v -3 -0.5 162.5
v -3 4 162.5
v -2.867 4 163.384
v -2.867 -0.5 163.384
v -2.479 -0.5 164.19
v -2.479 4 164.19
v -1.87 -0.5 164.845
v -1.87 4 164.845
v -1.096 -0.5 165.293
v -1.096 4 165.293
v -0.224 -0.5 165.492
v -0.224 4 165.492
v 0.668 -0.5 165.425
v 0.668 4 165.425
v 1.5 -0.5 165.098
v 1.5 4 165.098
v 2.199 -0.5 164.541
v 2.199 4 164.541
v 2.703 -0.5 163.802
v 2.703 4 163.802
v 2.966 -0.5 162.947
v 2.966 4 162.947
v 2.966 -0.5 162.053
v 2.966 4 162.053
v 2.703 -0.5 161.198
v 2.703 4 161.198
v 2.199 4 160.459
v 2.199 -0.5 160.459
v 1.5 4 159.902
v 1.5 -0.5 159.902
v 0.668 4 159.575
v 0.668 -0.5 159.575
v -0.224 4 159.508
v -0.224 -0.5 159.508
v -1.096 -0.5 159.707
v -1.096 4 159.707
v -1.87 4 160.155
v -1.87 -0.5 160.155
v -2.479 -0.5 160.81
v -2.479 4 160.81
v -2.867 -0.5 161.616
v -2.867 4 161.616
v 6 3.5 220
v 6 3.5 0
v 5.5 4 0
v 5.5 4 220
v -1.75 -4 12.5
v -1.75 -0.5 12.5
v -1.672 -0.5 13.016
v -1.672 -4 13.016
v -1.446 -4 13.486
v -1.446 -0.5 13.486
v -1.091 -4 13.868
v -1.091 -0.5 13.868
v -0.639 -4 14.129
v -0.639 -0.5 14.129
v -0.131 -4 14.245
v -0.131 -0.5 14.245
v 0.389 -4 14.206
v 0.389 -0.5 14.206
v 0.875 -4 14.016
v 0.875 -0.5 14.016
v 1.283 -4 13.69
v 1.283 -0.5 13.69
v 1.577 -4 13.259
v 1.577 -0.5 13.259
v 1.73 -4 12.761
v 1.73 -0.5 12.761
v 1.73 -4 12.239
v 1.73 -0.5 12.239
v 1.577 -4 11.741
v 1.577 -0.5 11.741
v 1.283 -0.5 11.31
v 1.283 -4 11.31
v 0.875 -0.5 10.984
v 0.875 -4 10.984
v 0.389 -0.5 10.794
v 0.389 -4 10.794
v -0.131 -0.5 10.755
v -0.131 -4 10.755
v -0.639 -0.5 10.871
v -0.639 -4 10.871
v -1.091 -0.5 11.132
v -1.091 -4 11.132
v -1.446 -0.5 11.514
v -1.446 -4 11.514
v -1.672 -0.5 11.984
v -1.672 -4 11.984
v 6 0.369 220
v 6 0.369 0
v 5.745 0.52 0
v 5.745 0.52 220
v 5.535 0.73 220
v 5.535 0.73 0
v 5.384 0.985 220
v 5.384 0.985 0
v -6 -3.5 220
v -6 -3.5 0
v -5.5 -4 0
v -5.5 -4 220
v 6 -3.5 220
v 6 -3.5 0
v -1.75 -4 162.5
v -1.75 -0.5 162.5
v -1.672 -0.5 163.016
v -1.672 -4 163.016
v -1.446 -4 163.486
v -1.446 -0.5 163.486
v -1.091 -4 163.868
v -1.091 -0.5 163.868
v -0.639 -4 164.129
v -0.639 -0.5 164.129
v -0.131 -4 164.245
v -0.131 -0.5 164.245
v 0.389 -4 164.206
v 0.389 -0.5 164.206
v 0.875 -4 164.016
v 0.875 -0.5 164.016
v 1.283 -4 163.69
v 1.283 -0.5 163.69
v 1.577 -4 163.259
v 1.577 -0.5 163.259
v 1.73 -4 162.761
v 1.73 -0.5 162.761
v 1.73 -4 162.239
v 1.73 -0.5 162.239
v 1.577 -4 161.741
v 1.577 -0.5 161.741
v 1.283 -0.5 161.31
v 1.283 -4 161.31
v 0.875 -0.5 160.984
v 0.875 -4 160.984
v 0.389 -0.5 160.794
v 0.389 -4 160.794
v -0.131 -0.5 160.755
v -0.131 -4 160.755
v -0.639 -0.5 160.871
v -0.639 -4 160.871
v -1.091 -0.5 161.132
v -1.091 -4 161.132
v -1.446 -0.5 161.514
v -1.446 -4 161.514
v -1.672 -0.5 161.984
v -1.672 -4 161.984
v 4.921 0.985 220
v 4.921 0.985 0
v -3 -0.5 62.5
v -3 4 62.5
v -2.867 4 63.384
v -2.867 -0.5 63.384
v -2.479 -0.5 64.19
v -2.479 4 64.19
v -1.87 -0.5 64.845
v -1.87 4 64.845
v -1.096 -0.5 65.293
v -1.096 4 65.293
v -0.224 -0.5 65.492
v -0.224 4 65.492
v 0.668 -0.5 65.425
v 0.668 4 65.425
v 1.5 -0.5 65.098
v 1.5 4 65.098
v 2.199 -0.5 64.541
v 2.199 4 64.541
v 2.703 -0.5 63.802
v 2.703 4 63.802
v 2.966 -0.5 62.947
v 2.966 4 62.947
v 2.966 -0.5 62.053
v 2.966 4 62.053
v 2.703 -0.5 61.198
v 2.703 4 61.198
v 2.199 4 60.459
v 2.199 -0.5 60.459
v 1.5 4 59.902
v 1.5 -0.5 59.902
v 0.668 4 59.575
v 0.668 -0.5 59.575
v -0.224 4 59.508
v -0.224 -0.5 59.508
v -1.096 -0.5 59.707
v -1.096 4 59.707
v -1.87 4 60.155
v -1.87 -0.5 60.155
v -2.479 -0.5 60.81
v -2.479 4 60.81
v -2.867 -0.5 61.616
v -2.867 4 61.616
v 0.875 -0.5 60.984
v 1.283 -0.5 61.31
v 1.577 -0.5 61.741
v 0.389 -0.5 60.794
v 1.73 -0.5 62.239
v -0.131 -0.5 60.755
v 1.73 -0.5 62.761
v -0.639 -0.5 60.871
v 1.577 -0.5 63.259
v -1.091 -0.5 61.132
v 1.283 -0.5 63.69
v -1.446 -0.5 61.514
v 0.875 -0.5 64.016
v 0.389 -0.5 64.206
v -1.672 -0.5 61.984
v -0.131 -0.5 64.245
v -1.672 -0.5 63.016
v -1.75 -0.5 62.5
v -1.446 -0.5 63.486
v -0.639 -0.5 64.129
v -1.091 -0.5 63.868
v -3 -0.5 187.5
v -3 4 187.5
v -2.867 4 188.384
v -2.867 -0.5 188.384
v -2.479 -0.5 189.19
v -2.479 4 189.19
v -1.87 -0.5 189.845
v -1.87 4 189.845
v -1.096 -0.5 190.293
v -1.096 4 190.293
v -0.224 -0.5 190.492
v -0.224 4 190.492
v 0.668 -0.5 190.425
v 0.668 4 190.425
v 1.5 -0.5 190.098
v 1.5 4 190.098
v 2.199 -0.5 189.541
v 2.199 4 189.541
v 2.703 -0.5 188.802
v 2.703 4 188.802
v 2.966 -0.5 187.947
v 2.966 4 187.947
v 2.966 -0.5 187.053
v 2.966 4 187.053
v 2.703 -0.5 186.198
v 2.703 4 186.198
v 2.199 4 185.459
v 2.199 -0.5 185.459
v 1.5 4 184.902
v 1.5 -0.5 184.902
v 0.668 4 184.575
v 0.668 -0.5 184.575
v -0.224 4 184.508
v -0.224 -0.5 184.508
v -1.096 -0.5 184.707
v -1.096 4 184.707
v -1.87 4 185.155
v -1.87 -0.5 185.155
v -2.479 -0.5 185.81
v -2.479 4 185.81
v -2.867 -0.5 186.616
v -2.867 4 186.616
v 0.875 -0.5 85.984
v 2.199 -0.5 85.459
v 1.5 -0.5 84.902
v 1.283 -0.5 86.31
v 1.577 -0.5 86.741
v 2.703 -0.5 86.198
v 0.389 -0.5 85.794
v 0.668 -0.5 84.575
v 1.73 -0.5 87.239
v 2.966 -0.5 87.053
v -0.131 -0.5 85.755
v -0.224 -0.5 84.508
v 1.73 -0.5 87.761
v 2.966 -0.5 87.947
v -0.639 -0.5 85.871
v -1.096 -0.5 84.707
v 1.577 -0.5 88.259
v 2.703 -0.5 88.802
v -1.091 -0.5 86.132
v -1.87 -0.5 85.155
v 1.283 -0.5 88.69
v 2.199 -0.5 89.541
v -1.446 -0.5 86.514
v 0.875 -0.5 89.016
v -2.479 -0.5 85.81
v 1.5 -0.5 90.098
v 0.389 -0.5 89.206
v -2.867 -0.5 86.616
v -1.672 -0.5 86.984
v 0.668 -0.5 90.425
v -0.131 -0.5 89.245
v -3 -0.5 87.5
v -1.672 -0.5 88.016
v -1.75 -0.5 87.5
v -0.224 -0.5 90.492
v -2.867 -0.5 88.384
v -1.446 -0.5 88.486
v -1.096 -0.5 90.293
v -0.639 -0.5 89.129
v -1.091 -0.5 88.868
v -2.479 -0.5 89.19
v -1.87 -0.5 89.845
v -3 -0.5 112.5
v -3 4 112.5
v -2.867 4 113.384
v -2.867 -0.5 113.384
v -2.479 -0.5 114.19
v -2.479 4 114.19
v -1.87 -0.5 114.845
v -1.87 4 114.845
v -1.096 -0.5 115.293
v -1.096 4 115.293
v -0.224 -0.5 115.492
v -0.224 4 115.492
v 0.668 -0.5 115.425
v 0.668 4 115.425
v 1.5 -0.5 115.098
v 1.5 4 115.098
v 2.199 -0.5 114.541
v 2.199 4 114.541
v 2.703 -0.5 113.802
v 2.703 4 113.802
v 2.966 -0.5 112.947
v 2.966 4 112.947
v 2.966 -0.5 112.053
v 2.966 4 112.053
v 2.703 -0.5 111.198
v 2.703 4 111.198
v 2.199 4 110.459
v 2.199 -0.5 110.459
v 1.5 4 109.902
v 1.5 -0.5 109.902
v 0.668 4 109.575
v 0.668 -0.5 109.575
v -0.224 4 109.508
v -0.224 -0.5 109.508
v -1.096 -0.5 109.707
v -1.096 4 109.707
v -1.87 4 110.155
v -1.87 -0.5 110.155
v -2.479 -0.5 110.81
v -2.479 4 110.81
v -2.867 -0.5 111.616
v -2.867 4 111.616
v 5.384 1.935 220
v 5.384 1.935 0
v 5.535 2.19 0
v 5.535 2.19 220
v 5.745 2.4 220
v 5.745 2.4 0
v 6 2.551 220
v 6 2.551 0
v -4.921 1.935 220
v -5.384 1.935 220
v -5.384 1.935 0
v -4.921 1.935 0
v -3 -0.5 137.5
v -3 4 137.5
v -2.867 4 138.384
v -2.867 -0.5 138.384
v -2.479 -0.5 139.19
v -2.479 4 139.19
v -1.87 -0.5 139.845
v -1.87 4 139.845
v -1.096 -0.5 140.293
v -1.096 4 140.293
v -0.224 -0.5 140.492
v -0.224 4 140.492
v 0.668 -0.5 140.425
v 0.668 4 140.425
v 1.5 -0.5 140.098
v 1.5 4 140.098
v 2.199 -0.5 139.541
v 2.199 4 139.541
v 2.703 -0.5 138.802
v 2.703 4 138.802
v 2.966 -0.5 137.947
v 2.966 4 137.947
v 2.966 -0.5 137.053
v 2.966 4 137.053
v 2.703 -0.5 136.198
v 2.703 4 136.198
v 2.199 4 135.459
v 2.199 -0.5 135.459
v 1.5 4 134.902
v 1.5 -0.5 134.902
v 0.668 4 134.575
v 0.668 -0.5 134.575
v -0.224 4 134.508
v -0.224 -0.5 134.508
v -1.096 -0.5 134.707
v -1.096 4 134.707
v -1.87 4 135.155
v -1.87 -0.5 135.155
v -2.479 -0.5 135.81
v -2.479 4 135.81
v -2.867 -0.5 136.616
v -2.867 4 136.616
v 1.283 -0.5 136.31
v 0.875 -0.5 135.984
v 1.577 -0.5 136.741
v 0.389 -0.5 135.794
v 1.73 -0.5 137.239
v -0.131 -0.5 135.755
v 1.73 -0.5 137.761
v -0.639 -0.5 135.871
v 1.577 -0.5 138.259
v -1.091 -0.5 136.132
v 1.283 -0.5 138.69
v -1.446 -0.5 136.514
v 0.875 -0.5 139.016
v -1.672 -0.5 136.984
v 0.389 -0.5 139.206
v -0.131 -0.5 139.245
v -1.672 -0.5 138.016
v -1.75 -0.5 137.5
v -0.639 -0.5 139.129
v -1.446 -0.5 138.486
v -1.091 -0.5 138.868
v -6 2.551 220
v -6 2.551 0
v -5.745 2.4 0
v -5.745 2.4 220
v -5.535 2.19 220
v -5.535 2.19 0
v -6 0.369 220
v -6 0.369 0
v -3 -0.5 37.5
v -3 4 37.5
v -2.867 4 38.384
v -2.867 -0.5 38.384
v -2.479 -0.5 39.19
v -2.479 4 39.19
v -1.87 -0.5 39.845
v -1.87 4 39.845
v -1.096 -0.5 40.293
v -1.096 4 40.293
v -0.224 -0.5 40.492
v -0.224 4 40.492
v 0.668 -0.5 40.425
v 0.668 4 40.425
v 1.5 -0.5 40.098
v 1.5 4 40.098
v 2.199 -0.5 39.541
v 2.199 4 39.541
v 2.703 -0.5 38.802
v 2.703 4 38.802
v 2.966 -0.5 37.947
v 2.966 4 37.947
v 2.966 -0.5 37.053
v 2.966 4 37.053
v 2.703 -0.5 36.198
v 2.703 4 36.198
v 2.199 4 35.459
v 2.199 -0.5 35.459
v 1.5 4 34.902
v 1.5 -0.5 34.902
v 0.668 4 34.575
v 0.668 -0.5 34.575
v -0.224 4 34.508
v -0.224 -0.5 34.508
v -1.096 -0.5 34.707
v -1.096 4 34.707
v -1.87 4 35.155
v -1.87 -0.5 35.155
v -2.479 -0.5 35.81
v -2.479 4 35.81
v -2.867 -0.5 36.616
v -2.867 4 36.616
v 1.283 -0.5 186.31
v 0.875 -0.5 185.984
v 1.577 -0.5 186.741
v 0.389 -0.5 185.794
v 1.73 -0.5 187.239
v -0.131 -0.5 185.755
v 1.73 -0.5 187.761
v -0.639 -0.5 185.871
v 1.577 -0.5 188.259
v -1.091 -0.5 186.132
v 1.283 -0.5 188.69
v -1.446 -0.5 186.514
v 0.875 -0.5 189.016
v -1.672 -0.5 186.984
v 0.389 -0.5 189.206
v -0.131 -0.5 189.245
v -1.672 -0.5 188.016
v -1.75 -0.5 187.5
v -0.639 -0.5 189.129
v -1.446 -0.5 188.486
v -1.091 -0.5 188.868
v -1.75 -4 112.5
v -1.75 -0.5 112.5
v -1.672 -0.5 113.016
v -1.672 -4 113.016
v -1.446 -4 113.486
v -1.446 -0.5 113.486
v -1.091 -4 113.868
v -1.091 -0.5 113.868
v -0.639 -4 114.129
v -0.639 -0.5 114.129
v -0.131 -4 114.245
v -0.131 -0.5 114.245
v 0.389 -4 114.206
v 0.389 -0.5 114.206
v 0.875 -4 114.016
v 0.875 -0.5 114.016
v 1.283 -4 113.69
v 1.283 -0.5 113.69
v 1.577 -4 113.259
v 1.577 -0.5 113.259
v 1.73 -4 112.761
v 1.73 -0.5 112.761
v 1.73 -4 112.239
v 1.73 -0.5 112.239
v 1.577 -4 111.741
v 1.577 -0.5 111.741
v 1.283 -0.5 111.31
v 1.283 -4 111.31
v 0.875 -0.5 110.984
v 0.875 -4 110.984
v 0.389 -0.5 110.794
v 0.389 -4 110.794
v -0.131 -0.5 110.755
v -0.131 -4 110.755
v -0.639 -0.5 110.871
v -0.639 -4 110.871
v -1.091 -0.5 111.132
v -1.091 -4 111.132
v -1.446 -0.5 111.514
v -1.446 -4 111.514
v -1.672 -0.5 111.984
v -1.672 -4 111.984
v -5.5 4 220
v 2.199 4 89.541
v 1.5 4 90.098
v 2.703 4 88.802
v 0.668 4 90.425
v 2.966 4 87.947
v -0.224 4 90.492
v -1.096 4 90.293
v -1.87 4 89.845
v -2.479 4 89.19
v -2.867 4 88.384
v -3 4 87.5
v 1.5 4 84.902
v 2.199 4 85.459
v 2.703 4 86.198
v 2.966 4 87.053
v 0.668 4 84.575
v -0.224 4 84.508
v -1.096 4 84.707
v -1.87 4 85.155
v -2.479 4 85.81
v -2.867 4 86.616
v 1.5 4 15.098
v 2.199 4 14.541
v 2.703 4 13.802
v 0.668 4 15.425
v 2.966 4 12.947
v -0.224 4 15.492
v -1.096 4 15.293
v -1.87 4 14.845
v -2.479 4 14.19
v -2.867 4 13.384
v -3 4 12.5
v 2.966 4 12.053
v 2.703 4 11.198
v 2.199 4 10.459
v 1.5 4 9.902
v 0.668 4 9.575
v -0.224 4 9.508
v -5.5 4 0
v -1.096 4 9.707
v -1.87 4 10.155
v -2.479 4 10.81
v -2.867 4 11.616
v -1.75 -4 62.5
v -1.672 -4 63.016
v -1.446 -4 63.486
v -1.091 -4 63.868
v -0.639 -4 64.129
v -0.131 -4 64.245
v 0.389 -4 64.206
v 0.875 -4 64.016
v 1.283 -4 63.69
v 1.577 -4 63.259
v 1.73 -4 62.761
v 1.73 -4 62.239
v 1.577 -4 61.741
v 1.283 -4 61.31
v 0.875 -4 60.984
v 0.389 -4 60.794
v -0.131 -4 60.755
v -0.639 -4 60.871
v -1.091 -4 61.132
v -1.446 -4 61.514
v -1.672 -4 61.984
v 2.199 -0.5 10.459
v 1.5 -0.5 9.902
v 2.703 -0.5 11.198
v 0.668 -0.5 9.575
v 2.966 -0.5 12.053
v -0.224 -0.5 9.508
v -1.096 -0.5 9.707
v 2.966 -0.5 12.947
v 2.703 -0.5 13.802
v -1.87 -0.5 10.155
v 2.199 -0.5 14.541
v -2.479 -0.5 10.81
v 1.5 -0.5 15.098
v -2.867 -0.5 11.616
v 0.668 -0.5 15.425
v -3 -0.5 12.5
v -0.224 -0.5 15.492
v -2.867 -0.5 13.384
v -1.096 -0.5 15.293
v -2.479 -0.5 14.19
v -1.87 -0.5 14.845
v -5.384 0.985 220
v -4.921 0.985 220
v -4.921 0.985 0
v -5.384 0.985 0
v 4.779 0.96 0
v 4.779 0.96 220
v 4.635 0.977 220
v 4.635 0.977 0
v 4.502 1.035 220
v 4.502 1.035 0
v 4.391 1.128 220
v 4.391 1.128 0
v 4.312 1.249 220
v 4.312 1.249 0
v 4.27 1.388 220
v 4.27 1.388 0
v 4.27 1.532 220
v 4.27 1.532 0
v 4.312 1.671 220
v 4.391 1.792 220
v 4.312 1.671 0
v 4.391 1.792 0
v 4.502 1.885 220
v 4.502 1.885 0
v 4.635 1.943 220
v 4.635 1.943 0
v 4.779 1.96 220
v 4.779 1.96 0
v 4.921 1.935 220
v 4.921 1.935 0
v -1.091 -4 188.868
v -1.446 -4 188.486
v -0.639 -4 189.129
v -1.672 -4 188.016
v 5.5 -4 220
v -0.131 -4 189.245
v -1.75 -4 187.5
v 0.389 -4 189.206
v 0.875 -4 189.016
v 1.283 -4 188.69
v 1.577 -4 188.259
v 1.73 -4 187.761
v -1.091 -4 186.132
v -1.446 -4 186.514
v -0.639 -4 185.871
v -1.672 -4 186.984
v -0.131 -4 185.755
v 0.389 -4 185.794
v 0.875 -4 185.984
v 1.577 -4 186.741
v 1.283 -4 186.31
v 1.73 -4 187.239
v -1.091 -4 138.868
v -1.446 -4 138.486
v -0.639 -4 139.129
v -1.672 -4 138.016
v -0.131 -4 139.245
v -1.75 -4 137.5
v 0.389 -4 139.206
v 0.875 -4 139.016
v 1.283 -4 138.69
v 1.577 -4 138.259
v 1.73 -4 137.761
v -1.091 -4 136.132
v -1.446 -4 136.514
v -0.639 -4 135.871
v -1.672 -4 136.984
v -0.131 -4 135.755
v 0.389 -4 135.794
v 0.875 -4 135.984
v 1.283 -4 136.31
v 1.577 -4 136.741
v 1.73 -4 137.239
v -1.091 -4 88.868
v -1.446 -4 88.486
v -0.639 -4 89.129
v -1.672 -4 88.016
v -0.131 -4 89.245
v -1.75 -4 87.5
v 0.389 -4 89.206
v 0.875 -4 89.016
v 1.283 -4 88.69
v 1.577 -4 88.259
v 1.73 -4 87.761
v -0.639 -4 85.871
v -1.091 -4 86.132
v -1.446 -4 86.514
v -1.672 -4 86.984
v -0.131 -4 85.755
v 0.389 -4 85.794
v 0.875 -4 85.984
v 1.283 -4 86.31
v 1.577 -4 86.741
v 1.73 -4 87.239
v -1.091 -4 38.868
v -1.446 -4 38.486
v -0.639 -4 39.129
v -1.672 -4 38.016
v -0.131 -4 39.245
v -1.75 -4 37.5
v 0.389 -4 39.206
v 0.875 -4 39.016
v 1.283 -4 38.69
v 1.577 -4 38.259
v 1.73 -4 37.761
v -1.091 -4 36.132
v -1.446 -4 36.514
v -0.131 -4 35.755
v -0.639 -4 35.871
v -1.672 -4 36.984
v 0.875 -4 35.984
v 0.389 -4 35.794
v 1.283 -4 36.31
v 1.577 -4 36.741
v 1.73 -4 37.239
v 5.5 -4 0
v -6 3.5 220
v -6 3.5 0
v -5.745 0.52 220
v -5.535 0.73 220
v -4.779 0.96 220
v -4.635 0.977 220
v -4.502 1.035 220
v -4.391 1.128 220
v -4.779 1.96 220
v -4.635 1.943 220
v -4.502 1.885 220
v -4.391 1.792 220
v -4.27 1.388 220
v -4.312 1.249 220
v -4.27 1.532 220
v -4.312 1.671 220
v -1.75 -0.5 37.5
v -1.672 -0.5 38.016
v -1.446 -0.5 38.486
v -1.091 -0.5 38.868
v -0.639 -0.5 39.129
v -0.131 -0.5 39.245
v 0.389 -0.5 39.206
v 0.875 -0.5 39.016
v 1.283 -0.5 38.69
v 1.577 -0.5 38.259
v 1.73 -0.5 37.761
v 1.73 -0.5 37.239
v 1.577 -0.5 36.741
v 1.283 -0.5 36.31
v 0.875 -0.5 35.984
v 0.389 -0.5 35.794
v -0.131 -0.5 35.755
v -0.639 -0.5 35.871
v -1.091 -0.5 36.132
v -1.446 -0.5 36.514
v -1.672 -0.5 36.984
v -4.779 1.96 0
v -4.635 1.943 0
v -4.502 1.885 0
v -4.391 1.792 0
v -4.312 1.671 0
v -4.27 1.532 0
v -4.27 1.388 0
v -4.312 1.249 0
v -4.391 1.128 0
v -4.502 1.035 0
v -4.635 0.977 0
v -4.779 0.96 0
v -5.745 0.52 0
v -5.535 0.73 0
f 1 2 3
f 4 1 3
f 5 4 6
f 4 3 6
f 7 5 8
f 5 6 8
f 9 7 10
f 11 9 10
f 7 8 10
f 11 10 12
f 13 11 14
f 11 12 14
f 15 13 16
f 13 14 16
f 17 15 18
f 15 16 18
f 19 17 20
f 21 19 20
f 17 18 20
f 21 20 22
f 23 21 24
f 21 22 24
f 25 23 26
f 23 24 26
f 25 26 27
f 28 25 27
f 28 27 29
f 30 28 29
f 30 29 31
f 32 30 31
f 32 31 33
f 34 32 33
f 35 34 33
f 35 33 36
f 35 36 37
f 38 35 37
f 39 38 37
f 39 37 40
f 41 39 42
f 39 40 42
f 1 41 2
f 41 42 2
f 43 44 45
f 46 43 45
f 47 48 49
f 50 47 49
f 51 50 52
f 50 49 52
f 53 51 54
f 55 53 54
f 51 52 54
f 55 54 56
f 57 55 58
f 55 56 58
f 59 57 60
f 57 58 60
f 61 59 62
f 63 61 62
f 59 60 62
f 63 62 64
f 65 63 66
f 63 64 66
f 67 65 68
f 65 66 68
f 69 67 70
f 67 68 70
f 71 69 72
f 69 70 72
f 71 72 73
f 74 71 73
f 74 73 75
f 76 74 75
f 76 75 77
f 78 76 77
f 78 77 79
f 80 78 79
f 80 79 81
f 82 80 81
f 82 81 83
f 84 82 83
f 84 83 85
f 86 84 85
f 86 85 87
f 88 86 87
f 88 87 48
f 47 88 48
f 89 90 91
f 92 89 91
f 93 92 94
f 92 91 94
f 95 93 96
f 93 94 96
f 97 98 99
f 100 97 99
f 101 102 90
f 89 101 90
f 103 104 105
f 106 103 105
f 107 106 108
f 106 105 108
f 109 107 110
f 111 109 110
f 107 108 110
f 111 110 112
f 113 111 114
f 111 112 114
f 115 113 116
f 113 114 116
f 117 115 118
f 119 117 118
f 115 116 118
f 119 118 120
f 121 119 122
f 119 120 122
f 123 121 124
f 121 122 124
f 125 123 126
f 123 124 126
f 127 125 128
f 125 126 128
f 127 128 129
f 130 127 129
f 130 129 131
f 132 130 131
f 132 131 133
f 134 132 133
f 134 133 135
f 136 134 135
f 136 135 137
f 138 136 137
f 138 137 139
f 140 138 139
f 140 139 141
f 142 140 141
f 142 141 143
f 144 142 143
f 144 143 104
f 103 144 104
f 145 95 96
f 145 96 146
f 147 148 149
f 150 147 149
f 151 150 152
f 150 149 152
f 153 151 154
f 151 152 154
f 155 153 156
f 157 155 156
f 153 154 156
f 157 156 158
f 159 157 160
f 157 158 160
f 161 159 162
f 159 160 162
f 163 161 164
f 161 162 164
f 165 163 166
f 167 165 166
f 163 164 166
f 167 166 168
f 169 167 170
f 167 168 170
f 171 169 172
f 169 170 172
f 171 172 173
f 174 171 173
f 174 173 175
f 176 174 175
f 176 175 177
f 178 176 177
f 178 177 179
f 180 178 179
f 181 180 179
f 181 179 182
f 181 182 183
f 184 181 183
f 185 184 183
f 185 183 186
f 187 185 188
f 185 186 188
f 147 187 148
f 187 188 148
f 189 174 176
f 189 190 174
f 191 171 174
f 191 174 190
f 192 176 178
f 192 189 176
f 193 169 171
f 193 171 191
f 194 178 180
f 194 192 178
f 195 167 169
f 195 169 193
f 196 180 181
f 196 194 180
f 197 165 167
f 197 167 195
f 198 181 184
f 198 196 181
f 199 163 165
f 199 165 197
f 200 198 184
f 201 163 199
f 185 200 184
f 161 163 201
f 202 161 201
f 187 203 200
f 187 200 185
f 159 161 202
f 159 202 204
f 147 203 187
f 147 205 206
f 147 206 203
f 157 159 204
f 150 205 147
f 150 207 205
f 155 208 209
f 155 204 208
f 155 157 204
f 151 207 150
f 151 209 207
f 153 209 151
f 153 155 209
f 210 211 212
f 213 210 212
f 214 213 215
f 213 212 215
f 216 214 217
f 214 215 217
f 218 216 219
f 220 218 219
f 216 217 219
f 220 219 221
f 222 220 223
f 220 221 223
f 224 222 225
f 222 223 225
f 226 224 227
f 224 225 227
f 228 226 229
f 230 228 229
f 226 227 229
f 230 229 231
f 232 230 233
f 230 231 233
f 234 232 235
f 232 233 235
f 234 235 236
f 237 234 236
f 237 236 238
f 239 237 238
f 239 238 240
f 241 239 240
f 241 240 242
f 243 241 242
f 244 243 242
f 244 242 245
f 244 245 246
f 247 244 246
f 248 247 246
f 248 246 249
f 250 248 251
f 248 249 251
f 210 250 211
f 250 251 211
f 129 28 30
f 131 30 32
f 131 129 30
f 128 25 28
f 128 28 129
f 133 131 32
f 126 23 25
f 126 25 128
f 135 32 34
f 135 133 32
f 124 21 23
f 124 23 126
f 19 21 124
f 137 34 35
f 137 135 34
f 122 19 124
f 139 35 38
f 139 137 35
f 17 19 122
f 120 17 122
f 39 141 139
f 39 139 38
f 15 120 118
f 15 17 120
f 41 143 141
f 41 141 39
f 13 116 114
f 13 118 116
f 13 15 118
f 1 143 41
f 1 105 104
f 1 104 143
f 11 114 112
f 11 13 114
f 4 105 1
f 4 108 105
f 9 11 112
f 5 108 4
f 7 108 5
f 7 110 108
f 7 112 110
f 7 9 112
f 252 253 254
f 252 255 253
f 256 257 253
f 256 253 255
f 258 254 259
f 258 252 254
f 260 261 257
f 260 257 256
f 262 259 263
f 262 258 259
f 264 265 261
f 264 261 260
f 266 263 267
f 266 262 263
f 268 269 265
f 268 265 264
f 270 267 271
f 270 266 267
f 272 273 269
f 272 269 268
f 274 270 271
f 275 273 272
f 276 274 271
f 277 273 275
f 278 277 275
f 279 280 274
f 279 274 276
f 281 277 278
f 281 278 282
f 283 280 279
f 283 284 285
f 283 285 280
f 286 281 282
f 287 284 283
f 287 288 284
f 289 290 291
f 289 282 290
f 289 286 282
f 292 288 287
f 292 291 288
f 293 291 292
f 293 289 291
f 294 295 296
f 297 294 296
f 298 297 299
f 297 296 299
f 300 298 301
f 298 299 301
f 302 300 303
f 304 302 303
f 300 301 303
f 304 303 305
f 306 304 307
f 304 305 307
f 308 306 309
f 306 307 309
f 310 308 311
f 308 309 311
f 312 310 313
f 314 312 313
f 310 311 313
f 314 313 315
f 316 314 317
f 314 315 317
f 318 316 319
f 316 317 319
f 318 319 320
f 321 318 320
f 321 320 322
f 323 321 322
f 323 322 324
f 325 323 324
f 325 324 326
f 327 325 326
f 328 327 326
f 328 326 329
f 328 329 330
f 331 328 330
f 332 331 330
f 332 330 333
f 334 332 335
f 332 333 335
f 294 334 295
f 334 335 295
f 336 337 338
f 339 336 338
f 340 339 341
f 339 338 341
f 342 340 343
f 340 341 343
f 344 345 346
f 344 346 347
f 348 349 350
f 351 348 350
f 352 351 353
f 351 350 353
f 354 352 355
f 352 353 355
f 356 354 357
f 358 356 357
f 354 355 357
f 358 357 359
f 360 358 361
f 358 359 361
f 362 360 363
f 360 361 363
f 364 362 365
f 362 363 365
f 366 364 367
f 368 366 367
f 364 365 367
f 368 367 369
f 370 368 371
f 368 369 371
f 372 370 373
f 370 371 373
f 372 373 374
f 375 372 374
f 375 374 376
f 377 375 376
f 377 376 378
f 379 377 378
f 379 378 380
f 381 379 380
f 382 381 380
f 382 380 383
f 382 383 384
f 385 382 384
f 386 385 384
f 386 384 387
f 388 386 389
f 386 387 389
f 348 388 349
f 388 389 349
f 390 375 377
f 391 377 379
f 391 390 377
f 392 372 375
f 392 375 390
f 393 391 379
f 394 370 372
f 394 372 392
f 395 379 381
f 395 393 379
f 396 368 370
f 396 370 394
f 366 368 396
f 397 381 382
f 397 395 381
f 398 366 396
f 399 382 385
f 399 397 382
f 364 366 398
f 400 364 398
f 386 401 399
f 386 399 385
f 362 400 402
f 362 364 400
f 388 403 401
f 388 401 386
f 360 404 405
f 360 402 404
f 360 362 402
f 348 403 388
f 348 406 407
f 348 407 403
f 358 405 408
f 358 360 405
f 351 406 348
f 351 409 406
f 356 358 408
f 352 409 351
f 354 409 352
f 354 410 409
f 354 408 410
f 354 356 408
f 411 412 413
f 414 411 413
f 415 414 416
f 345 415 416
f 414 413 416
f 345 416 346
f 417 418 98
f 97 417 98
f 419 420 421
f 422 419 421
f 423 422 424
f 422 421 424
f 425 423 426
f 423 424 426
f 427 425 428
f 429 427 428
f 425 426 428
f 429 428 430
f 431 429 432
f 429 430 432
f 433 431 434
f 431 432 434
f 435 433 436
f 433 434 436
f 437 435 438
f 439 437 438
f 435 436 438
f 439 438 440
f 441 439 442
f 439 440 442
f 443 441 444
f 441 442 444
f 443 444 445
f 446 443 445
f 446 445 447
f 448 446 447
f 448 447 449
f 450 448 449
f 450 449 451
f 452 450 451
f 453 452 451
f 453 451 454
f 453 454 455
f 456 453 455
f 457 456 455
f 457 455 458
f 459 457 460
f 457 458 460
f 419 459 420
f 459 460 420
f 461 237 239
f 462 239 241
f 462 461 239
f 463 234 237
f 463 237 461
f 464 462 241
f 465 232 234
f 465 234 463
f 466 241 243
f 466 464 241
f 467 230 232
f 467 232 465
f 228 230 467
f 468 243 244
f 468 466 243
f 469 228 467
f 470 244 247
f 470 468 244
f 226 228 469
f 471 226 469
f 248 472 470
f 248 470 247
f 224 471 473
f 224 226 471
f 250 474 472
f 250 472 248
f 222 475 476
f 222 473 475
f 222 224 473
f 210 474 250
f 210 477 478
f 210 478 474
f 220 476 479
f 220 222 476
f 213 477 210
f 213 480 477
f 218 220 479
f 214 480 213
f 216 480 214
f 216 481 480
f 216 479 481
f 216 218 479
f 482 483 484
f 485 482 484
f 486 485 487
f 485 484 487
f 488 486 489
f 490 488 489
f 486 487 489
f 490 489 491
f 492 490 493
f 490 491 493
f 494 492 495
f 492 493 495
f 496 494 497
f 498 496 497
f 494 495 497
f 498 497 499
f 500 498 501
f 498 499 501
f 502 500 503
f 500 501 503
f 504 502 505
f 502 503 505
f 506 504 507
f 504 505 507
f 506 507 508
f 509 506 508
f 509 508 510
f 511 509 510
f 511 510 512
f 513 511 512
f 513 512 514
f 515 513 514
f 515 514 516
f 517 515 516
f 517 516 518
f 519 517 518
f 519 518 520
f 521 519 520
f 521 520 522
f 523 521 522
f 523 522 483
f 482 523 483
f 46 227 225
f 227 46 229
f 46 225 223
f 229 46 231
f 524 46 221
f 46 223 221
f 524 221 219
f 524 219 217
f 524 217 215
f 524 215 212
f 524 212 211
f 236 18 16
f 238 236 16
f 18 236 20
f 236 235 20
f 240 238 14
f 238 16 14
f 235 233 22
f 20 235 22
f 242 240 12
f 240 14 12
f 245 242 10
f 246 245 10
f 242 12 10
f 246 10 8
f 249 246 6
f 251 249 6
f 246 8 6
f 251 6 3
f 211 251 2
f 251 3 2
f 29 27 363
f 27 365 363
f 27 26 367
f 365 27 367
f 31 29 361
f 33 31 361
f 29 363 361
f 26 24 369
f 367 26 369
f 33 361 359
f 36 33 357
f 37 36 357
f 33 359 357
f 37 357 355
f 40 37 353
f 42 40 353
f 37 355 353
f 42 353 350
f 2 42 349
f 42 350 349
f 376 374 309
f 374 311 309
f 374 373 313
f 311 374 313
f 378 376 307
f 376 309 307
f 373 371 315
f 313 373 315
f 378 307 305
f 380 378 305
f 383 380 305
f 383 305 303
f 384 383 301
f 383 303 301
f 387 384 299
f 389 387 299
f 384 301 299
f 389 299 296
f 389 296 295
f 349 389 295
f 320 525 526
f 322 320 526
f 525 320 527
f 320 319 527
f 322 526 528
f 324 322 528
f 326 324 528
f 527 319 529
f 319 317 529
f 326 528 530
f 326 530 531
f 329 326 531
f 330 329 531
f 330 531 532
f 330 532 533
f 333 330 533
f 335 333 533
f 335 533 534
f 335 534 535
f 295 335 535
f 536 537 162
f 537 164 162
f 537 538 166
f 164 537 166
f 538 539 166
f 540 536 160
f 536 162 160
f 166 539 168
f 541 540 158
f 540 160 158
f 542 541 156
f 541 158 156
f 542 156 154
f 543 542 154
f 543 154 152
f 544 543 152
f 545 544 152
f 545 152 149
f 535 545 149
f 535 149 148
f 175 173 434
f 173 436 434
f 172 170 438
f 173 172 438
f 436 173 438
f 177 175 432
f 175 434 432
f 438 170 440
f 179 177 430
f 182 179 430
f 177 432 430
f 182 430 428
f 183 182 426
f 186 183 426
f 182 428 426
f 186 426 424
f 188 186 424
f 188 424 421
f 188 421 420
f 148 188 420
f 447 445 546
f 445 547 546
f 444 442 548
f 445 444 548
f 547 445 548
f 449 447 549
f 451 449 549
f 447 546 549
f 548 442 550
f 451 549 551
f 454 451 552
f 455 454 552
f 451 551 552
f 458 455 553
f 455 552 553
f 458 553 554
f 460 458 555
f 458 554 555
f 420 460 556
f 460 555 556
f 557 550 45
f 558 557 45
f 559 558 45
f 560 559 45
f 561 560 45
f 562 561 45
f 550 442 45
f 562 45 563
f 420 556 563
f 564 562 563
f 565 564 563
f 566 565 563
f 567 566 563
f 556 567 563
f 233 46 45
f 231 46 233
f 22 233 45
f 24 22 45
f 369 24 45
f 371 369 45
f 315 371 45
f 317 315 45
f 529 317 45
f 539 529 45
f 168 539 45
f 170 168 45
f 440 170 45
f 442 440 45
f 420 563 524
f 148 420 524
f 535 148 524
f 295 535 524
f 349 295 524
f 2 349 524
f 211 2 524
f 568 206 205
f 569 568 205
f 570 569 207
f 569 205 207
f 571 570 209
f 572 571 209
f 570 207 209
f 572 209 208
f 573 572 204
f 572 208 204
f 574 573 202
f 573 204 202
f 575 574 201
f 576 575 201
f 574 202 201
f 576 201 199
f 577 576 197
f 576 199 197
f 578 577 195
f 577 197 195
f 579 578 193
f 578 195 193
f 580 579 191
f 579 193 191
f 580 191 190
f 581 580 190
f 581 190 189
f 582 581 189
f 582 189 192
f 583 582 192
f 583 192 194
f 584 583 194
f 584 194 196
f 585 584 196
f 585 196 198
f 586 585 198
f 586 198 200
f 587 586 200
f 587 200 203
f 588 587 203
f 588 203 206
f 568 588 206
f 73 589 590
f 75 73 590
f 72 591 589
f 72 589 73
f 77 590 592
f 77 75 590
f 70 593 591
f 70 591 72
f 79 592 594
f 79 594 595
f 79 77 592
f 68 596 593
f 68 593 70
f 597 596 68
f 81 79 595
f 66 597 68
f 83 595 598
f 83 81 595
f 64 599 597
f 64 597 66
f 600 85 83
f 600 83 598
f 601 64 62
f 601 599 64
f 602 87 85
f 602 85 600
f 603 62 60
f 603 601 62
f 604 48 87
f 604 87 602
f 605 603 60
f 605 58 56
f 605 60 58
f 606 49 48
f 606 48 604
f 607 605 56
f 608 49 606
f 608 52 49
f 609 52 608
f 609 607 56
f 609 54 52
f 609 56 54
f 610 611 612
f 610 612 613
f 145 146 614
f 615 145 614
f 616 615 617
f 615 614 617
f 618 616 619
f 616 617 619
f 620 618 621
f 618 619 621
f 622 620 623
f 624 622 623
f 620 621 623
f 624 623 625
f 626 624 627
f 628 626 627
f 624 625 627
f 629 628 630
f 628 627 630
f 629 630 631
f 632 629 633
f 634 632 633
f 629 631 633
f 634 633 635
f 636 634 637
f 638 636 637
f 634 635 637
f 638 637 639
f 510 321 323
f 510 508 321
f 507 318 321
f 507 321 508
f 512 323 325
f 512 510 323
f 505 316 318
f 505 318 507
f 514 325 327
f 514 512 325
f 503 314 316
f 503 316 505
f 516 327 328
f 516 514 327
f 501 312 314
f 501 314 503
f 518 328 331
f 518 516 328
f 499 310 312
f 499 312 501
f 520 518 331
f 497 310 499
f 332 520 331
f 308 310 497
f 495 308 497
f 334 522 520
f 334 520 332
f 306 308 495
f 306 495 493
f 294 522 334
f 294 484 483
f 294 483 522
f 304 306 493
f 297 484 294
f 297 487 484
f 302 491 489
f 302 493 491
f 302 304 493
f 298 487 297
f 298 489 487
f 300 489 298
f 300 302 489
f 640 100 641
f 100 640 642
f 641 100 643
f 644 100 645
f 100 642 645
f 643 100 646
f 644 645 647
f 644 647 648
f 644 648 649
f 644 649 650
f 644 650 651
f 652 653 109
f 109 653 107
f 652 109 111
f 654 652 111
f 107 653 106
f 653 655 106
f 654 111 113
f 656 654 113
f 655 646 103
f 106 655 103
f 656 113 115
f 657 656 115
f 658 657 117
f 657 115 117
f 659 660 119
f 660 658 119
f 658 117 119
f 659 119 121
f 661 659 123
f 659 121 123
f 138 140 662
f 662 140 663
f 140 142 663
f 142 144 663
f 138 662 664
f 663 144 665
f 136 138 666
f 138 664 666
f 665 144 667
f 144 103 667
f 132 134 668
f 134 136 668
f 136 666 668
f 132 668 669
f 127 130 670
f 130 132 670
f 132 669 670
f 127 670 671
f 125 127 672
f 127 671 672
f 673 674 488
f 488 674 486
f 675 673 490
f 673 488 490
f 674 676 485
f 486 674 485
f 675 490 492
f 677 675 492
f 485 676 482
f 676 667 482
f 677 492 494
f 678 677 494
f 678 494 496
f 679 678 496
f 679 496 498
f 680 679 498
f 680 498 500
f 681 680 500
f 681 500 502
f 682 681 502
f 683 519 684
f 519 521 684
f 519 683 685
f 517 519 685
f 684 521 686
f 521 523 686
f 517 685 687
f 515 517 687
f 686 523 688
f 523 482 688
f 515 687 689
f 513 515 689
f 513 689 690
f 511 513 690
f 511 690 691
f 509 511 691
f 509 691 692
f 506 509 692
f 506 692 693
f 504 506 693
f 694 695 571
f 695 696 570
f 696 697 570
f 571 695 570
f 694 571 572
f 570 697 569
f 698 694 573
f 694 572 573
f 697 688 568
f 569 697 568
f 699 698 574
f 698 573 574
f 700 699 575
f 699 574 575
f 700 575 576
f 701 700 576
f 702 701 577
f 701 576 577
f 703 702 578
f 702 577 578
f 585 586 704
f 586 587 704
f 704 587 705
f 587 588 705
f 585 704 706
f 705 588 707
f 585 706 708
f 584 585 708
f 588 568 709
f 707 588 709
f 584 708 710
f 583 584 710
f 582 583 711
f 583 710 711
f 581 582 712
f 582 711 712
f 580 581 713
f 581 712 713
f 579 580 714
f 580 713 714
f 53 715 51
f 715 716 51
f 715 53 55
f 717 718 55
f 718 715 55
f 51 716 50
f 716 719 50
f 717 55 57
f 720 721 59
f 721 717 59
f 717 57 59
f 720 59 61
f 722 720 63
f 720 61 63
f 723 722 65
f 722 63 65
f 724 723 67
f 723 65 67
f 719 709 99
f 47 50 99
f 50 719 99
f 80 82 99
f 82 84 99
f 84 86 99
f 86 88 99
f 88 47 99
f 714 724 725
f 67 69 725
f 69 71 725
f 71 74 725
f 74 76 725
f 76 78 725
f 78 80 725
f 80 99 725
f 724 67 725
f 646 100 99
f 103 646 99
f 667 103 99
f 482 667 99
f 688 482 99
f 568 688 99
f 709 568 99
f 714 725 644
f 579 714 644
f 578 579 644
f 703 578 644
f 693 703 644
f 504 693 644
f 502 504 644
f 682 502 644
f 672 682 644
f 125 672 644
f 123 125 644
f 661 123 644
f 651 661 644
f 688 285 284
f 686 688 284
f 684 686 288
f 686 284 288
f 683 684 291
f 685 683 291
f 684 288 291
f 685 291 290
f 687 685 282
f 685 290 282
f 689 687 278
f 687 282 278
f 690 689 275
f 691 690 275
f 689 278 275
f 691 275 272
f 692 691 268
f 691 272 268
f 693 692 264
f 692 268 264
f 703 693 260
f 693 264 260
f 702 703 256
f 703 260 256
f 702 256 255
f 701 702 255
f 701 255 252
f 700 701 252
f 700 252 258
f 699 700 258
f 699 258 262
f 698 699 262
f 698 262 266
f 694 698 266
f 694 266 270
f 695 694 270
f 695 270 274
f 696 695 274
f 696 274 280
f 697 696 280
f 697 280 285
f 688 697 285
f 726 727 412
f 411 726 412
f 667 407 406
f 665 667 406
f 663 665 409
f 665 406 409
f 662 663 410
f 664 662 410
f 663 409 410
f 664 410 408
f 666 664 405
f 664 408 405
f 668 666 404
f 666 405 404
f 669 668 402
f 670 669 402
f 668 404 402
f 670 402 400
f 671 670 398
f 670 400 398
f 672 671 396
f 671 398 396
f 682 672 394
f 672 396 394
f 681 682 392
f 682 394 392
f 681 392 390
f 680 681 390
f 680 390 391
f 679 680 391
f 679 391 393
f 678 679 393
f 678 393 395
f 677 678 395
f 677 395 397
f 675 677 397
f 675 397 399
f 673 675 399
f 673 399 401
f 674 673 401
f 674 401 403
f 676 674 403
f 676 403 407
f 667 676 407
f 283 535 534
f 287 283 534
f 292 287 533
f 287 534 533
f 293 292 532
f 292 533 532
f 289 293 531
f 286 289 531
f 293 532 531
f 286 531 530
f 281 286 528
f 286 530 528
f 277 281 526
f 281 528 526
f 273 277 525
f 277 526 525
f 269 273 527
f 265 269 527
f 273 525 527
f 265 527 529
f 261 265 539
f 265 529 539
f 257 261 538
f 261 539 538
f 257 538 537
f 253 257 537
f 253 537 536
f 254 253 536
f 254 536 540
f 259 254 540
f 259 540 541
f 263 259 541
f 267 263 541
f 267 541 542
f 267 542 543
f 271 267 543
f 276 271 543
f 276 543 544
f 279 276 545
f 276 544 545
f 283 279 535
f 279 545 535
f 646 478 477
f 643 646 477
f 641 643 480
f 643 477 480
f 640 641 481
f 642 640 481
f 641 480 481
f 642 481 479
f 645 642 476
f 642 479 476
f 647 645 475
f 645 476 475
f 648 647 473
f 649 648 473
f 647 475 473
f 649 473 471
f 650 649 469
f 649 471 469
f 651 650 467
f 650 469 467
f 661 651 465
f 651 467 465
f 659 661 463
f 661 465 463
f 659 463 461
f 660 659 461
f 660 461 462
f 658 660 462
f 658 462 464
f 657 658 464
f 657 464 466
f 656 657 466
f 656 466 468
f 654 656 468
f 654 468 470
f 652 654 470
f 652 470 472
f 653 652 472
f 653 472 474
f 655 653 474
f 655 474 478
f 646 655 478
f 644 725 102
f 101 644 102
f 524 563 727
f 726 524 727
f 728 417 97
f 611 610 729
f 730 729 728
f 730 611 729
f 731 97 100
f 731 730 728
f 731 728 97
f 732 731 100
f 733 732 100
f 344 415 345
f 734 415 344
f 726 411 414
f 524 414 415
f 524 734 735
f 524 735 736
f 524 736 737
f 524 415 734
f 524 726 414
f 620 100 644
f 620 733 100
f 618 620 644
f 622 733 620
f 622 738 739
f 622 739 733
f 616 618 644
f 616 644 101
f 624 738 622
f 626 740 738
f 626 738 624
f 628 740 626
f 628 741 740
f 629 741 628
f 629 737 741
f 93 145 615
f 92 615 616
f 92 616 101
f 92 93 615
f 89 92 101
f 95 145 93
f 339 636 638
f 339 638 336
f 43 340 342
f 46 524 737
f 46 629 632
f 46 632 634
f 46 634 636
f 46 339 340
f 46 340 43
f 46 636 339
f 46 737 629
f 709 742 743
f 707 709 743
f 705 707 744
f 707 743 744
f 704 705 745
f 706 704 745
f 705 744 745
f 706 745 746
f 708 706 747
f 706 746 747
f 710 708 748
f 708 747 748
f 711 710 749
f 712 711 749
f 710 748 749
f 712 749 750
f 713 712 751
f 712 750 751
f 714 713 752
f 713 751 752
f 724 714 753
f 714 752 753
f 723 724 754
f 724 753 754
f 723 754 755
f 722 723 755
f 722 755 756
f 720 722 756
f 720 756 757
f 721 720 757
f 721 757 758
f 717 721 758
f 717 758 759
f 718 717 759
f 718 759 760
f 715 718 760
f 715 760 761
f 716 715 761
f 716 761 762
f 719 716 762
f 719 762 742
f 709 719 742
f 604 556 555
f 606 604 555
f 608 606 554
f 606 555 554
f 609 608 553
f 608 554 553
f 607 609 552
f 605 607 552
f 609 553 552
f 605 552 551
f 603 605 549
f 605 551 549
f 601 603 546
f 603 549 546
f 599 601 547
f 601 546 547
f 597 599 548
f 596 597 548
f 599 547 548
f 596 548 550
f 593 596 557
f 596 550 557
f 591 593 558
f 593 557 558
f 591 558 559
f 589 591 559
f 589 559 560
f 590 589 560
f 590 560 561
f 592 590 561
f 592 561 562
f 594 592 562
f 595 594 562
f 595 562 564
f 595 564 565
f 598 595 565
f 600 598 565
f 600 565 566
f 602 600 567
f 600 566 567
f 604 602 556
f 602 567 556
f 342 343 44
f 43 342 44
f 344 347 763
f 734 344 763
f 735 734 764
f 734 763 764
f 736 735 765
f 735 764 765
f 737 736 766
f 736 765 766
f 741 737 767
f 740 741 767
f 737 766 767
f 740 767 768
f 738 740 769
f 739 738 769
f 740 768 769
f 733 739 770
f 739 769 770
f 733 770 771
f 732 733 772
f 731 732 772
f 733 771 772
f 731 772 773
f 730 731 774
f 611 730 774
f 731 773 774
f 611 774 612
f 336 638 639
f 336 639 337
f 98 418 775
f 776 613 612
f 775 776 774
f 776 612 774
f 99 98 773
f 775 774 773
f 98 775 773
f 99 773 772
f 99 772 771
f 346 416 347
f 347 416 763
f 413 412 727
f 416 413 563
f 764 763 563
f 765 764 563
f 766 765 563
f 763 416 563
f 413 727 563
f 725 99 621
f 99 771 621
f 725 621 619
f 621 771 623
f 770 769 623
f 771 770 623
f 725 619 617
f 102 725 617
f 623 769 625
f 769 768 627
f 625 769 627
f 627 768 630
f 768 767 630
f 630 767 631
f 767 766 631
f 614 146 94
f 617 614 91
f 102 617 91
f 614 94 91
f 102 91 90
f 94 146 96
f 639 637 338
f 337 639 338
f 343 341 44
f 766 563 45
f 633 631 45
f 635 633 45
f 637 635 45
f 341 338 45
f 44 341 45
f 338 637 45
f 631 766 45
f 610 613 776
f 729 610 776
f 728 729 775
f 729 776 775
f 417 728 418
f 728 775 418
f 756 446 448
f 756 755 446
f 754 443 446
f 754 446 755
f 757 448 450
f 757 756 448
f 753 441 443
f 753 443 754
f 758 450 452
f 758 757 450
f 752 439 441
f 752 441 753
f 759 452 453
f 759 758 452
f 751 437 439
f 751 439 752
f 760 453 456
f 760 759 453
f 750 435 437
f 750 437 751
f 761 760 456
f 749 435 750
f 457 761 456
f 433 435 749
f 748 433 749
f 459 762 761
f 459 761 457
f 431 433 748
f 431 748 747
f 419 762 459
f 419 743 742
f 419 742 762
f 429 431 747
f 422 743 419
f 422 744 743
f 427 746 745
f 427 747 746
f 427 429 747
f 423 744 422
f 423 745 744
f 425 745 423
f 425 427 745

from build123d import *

# Parameters (mm, degrees)
BOSS_EXTRUDE1_DEPTH = 220
SKETCH2_R           = 3
CUT_EXTRUDE1_DEPTH  = 4.5
SKETCH3_R           = 1.75
CUT_EXTRUDE2_DEPTH  = 221.127803787
LPATTERN1_COUNT     = 8
LPATTERN1_PITCH     = 25


with BuildPart() as part:
    # Sketch1 → Boss-Extrude1 (new body)
    with BuildSketch(Plane.XY):
        with BuildLine():
            Line((6, -3.5), (6, 0.368911094))
            ThreePointArc((6, 0.368911094), (5.63354293, 0.61854293), (5.383911094, 0.985))
            Line((5.383911094, 0.985), (4.92112495, 0.985))
            ThreePointArc((4.92112495, 0.985), (4.265, 1.46), (4.92112495, 1.935))
            Line((4.92112495, 1.935), (5.383911094, 1.935))
            ThreePointArc((5.383911094, 1.935), (5.63354293, 2.30145707), (6, 2.551088906))
            Line((6, 2.551088906), (6, 3.5))
            Line((6, 3.5), (5.5, 4))
            Line((5.5, 4), (-5.5, 4))
            Line((-5.5, 4), (-6, 3.5))
            Line((-6, 3.5), (-6, 2.551088906))
            ThreePointArc((-6, 2.551088906), (-5.63354293, 2.30145707), (-5.383911094, 1.935))
            Line((-5.383911094, 1.935), (-4.92112495, 1.935))
            ThreePointArc((-4.92112495, 1.935), (-4.265, 1.46), (-4.92112495, 0.985))
            Line((-4.92112495, 0.985), (-5.383911094, 0.985))
            ThreePointArc((-5.383911094, 0.985), (-5.63354293, 0.61854293), (-6, 0.368911094))
            Line((-6, 0.368911094), (-6, -3.5))
            Line((-6, -3.5), (-5.5, -4))
            Line((-5.5, -4), (5.5, -4))
            Line((5.5, -4), (6, -3.5))
        make_face()
    extrude(amount=BOSS_EXTRUDE1_DEPTH)

    # Sketch2 → Cut-Extrude1 (cut)
    with BuildSketch(Plane(origin=(0, 4, 0), x_dir=(1, 0, 0), z_dir=(0, 1, 0))):
        with Locations(Location((0, -12.5, 0), (0, 0, 180))):
            Circle(SKETCH2_R)
    cut_extrude1 = extrude(amount=-CUT_EXTRUDE1_DEPTH, mode=Mode.SUBTRACT)

    # Sketch3 → Cut-Extrude2 (cut, through all)
    with BuildSketch(Plane(origin=(0, -0.5, 0), x_dir=(1, 0, 0), z_dir=(0, 1, 0))):
        with Locations(Location((0, -12.5, 0), (0, 0, 180))):
            Circle(SKETCH3_R)
    cut_extrude2 = extrude(amount=-CUT_EXTRUDE2_DEPTH, mode=Mode.SUBTRACT)

    # LPattern1: Cut-Extrude1, Cut-Extrude2 ×8
    with Locations(*[(0, 0, i * LPATTERN1_PITCH) for i in range(1, LPATTERN1_COUNT)]):
        add(cut_extrude1, mode=Mode.SUBTRACT)
        add(cut_extrude2, mode=Mode.SUBTRACT)


solid = part.part
